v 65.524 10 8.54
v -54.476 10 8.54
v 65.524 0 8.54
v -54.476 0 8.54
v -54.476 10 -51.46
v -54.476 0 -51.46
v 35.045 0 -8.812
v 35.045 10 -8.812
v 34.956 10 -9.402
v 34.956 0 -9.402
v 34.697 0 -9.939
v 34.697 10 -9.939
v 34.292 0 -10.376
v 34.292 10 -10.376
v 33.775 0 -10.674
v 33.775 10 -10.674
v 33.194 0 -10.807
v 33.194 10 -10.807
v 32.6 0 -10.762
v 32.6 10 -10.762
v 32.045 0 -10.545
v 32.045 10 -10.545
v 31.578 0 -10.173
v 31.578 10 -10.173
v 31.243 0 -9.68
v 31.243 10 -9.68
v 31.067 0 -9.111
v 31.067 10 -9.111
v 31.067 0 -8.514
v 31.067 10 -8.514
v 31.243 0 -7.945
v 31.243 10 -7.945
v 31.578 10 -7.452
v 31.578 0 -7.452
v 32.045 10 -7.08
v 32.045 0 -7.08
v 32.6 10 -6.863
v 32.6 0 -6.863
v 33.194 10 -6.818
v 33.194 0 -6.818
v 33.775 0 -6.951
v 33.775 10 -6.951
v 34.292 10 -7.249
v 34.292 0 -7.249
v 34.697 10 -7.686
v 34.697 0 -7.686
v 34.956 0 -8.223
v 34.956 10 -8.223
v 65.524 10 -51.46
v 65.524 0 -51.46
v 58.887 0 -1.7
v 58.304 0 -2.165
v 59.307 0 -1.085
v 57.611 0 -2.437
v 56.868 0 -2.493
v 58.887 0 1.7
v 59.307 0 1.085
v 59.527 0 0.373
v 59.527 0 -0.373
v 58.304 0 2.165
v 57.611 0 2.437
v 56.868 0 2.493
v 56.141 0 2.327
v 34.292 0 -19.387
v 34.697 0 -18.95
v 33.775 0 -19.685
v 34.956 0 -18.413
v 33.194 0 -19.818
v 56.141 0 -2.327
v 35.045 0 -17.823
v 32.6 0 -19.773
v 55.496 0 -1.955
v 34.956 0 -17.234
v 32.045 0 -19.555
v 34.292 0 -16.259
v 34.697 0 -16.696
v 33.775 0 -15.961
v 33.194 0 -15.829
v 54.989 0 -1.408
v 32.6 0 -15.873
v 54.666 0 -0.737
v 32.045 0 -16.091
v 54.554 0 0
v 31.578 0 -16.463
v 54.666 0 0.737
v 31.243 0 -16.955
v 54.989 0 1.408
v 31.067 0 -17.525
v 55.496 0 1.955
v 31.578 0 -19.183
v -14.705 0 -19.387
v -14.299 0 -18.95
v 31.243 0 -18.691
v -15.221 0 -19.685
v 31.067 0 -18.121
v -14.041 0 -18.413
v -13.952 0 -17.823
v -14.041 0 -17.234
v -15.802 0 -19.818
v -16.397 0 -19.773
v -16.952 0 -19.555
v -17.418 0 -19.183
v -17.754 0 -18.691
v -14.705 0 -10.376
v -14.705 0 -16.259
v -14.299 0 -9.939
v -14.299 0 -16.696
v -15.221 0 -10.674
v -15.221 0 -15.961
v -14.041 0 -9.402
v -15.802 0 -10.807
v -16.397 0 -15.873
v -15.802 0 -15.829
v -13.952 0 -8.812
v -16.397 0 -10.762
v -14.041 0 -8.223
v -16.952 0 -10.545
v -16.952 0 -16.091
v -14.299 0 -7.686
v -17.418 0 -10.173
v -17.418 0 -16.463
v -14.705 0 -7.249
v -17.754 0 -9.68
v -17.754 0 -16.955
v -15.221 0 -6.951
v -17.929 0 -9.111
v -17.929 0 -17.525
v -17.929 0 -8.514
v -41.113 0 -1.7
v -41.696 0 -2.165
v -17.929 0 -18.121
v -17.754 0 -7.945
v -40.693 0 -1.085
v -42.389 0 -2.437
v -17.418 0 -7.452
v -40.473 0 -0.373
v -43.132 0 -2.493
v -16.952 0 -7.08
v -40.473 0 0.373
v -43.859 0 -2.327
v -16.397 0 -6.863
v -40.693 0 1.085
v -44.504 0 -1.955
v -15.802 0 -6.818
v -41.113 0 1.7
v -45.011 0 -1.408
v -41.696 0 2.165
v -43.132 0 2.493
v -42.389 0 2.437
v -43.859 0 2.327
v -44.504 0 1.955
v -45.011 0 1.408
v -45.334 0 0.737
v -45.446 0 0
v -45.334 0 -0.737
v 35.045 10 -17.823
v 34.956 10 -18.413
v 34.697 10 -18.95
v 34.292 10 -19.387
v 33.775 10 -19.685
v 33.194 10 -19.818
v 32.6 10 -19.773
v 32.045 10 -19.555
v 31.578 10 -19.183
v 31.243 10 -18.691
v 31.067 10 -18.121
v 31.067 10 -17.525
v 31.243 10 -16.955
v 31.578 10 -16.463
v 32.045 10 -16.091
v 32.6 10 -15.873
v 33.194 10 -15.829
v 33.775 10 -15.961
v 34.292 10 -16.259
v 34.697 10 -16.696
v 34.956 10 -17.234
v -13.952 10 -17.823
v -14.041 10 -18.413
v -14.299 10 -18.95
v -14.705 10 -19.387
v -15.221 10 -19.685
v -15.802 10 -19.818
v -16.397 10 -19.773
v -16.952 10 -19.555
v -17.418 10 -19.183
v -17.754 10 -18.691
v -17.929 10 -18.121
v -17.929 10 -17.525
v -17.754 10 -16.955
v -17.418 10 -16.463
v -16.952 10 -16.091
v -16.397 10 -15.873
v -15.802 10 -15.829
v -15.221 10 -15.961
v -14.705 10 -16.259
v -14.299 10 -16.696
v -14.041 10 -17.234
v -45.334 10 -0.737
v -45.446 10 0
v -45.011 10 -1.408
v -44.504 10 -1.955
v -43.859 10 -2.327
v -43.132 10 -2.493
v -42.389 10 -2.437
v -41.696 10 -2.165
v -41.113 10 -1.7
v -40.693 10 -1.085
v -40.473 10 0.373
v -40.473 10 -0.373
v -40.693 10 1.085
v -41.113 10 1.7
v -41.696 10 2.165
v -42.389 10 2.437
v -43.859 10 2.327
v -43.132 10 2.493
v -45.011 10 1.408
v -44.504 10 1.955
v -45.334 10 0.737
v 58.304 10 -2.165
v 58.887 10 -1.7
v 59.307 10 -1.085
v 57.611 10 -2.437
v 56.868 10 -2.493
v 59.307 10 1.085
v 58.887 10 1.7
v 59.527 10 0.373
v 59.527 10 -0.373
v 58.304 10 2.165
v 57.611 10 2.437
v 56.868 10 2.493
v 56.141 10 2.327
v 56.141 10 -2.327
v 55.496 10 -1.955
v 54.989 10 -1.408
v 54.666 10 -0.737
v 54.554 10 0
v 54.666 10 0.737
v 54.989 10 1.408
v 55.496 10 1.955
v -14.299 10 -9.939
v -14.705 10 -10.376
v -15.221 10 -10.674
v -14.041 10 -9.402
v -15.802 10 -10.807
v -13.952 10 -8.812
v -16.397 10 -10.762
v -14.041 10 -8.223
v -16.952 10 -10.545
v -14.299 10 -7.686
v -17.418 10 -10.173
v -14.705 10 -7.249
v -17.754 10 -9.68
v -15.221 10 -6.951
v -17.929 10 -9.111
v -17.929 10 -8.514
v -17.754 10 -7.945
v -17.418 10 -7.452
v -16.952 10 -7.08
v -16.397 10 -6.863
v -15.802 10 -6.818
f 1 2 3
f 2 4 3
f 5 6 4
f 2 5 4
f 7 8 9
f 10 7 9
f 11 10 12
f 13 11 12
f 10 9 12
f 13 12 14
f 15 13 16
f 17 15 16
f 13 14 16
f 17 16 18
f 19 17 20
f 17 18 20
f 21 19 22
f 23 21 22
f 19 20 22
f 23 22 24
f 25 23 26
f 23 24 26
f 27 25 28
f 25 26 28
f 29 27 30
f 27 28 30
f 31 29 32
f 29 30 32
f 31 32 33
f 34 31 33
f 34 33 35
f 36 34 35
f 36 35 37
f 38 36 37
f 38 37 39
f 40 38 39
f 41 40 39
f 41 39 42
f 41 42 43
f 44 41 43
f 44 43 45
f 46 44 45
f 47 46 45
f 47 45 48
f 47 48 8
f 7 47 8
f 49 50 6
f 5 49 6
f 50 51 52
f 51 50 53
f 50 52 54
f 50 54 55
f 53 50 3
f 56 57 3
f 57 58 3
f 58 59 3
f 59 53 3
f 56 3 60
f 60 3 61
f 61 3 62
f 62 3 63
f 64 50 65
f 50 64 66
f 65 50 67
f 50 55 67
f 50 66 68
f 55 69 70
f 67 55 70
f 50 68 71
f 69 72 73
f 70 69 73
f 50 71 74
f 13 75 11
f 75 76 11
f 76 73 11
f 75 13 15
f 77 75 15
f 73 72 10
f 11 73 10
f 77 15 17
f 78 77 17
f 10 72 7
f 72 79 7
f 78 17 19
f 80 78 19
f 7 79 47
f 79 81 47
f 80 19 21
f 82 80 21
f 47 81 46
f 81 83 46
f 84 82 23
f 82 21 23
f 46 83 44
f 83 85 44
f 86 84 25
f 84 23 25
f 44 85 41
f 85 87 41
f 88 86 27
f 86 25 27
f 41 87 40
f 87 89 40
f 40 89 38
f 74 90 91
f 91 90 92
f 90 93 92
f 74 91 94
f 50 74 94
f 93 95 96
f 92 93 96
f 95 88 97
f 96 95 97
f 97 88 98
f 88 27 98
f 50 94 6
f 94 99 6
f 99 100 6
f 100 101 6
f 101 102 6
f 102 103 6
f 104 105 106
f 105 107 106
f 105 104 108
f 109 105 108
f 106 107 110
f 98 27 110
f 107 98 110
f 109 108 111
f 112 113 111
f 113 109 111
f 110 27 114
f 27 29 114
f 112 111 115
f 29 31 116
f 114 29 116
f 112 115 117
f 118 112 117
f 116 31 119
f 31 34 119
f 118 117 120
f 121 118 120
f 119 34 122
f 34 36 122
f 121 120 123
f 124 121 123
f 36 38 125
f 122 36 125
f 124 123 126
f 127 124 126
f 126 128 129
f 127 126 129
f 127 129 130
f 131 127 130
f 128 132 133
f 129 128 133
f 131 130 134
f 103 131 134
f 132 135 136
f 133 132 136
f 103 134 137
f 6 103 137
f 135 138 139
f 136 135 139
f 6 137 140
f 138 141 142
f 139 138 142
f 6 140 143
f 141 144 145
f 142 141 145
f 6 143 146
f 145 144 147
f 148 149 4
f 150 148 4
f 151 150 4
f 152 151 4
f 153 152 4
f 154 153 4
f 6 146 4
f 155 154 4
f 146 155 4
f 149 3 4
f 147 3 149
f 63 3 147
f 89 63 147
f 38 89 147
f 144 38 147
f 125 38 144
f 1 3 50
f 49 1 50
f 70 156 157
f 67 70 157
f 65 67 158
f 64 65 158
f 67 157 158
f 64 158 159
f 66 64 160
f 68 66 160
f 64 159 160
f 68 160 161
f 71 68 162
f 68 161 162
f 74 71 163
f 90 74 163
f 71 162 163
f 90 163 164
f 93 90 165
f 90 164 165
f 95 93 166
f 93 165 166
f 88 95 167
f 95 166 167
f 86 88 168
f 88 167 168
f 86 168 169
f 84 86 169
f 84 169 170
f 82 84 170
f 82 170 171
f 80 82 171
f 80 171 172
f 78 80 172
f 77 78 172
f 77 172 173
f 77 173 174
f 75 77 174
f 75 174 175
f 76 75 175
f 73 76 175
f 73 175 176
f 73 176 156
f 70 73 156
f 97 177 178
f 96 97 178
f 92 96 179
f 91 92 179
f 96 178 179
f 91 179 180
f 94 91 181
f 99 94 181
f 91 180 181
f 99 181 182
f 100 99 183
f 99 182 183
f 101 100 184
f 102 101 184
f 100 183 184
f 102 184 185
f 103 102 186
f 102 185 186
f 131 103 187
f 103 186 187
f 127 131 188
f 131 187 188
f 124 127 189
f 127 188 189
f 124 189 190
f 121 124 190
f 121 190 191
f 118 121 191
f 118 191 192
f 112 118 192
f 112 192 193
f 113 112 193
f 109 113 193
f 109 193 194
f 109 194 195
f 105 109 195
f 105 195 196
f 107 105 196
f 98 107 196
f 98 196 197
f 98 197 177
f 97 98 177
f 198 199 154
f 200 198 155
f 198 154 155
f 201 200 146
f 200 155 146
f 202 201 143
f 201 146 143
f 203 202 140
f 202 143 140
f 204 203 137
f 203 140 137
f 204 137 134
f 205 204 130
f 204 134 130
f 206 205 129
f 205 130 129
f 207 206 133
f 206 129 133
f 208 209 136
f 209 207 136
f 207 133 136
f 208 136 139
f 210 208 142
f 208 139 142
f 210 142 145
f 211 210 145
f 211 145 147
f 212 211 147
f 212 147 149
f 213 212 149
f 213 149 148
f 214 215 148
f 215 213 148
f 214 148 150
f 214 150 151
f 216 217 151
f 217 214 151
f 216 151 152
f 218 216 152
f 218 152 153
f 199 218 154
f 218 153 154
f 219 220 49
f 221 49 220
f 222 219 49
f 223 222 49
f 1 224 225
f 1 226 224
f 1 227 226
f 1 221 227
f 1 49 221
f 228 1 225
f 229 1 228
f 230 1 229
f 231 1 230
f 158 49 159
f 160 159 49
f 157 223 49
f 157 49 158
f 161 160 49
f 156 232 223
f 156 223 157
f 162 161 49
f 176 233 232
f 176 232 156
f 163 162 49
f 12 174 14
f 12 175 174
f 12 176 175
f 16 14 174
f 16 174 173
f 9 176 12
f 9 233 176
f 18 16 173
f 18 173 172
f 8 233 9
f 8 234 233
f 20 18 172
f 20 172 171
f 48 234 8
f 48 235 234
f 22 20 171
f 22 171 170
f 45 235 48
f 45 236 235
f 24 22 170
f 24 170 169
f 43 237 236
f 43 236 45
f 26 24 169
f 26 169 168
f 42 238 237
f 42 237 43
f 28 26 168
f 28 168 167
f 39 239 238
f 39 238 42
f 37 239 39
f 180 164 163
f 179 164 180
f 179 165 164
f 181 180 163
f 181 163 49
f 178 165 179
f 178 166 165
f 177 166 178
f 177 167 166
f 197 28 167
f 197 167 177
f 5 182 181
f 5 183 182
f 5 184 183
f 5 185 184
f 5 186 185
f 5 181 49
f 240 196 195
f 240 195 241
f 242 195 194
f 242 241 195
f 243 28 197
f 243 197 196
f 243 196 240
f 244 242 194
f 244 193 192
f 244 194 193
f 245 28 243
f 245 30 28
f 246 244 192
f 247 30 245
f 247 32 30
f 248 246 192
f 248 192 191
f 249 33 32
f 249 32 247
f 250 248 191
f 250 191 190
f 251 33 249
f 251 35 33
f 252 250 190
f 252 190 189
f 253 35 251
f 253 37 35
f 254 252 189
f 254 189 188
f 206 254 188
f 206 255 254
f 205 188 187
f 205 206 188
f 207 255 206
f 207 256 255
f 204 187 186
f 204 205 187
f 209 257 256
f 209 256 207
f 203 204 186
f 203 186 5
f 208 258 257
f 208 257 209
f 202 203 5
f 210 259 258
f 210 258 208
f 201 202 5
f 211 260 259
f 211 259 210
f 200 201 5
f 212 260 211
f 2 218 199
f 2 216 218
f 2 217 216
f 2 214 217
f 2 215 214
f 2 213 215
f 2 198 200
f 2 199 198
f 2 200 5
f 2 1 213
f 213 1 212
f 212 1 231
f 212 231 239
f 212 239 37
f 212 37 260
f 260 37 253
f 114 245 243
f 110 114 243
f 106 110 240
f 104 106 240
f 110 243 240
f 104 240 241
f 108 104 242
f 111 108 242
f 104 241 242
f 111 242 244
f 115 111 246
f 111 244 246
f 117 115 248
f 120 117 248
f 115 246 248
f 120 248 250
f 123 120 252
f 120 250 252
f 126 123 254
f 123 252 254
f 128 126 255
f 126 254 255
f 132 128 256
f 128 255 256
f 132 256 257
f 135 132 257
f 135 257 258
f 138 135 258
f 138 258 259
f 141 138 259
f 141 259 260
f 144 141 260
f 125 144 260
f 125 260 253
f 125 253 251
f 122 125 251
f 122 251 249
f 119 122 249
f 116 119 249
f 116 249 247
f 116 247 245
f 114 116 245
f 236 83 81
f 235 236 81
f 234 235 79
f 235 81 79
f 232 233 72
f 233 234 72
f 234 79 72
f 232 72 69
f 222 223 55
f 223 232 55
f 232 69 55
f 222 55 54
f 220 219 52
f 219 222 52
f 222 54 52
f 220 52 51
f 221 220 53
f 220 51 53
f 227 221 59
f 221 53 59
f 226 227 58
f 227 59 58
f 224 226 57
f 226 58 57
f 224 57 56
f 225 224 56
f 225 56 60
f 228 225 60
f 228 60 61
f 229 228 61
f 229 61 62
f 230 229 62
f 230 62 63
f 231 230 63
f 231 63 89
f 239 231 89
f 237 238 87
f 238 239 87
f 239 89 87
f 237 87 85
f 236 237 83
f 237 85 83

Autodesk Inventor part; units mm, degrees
ref_plane "YZ Plane" through (0, 0, 0) normal (1, 0, 0) x (0, 1, 0)
ref_plane "XZ Plane" through (0, 0, 0) normal (0, 1, 0) x (-1, 0, 0)
ref_plane "XY Plane" through (0, 0, 0) normal (0, 0, 1) x (1, 0, 0)
sketch "Sketch1" plane through (0, 0, 0) normal (0, 1, 0) x (-1, 0, 0)
  line L0 (54.4765, 8.5395) -> (-65.5235, 8.5395)
  line L1 (-65.5235, 8.5395) -> (-65.5235, -51.4605)
  line L2 (-65.5235, -51.4605) -> (54.4765, -51.4605)
  line L3 (54.4765, -51.4605) -> (54.4765, 8.5395)
  line L4 (42.9455, 0) -> (-57.0545, 0)
  circle A0 centre (42.9455, 0) radius 2.5
  circle A1 centre (-57.0545, 0) radius 2.5
  point P0 (0, 0)
  dimension "d0" = 120
  dimension "d1" = 60
  dimension "d2" = 100
  dimension "d3" = 5
  dimension "d4" = 5
extrude "Extrusion1" add sketch "Sketch1" along normal blind 10
sketch "Sketch2" plane through (0, 10, 0) normal (0, 1, 0) x (1, 0, 0)
  line L0 (-16.1382, 5.2435) -> (17.0718, 5.2435)
  circle A0 centre (-16.1382, 5.2435) radius 1
  circle A1 centre (17.0718, 5.2435) radius 1
  point P0 (0, 0)
  dimension "d7" = 33.21
  dimension "d8" = 2
  dimension "d9" = 2
extrude "Extrusion2" cut sketch "Sketch2" along normal blind 10
sketch "Sketch3" plane through (0, 10, 0) normal (0, 1, 0) x (1, 0, 0)
  point P0 (0, 0)
sketch "Sketch4" plane through (0, 10, 0) normal (0, 1, 0) x (1, 0, 0)
  circle A0 centre (-16.1382, 5.2435) radius 1 projected
  circle A1 centre (30.8669, 5.2794) radius 1
  point P0 (0, 0)
  dimension "d13" = 2
extrude "Extrusion3" cut sketch "Sketch4" along normal blind 10 contours A1
sketch "Sketch5" plane through (0, 10, 0) normal (0, 1, 0) x (1, 0, 0)
  circle A0 centre (-16.1382, 5.2435) radius 1 projected
  circle A1 centre (30.8669, 5.2794) radius 1 projected
  circle A2 centre (30.8669, 14.2341) radius 2
  circle A3 centre (-16.1382, 14.2341) radius 2
  point P0 (0, 0)
  dimension "d20" = 4
  dimension "d21" = 4
extrude "Extrusion4" cut sketch "Sketch5" along normal blind 10 contours A2 | A3
sketch "Sketch6" plane through (0, 10, 0) normal (0, 1, 0) x (1, 0, 0)
  circle A0 centre (-15.9518, 8.8125) radius 2
  circle A1 centre (33.0446, 8.8125) radius 2
  circle A2 centre (-15.9518, 17.8231) radius 2
  circle A3 centre (33.0446, 17.8231) radius 2
  point P0 (0, 0)
  dimension "d24" = 4
  dimension "d26" = 4
  dimension "d30" = 4
extrude "Extrusion5" cut sketch "Sketch6" against normal blind 10
properties part number "servostand"
